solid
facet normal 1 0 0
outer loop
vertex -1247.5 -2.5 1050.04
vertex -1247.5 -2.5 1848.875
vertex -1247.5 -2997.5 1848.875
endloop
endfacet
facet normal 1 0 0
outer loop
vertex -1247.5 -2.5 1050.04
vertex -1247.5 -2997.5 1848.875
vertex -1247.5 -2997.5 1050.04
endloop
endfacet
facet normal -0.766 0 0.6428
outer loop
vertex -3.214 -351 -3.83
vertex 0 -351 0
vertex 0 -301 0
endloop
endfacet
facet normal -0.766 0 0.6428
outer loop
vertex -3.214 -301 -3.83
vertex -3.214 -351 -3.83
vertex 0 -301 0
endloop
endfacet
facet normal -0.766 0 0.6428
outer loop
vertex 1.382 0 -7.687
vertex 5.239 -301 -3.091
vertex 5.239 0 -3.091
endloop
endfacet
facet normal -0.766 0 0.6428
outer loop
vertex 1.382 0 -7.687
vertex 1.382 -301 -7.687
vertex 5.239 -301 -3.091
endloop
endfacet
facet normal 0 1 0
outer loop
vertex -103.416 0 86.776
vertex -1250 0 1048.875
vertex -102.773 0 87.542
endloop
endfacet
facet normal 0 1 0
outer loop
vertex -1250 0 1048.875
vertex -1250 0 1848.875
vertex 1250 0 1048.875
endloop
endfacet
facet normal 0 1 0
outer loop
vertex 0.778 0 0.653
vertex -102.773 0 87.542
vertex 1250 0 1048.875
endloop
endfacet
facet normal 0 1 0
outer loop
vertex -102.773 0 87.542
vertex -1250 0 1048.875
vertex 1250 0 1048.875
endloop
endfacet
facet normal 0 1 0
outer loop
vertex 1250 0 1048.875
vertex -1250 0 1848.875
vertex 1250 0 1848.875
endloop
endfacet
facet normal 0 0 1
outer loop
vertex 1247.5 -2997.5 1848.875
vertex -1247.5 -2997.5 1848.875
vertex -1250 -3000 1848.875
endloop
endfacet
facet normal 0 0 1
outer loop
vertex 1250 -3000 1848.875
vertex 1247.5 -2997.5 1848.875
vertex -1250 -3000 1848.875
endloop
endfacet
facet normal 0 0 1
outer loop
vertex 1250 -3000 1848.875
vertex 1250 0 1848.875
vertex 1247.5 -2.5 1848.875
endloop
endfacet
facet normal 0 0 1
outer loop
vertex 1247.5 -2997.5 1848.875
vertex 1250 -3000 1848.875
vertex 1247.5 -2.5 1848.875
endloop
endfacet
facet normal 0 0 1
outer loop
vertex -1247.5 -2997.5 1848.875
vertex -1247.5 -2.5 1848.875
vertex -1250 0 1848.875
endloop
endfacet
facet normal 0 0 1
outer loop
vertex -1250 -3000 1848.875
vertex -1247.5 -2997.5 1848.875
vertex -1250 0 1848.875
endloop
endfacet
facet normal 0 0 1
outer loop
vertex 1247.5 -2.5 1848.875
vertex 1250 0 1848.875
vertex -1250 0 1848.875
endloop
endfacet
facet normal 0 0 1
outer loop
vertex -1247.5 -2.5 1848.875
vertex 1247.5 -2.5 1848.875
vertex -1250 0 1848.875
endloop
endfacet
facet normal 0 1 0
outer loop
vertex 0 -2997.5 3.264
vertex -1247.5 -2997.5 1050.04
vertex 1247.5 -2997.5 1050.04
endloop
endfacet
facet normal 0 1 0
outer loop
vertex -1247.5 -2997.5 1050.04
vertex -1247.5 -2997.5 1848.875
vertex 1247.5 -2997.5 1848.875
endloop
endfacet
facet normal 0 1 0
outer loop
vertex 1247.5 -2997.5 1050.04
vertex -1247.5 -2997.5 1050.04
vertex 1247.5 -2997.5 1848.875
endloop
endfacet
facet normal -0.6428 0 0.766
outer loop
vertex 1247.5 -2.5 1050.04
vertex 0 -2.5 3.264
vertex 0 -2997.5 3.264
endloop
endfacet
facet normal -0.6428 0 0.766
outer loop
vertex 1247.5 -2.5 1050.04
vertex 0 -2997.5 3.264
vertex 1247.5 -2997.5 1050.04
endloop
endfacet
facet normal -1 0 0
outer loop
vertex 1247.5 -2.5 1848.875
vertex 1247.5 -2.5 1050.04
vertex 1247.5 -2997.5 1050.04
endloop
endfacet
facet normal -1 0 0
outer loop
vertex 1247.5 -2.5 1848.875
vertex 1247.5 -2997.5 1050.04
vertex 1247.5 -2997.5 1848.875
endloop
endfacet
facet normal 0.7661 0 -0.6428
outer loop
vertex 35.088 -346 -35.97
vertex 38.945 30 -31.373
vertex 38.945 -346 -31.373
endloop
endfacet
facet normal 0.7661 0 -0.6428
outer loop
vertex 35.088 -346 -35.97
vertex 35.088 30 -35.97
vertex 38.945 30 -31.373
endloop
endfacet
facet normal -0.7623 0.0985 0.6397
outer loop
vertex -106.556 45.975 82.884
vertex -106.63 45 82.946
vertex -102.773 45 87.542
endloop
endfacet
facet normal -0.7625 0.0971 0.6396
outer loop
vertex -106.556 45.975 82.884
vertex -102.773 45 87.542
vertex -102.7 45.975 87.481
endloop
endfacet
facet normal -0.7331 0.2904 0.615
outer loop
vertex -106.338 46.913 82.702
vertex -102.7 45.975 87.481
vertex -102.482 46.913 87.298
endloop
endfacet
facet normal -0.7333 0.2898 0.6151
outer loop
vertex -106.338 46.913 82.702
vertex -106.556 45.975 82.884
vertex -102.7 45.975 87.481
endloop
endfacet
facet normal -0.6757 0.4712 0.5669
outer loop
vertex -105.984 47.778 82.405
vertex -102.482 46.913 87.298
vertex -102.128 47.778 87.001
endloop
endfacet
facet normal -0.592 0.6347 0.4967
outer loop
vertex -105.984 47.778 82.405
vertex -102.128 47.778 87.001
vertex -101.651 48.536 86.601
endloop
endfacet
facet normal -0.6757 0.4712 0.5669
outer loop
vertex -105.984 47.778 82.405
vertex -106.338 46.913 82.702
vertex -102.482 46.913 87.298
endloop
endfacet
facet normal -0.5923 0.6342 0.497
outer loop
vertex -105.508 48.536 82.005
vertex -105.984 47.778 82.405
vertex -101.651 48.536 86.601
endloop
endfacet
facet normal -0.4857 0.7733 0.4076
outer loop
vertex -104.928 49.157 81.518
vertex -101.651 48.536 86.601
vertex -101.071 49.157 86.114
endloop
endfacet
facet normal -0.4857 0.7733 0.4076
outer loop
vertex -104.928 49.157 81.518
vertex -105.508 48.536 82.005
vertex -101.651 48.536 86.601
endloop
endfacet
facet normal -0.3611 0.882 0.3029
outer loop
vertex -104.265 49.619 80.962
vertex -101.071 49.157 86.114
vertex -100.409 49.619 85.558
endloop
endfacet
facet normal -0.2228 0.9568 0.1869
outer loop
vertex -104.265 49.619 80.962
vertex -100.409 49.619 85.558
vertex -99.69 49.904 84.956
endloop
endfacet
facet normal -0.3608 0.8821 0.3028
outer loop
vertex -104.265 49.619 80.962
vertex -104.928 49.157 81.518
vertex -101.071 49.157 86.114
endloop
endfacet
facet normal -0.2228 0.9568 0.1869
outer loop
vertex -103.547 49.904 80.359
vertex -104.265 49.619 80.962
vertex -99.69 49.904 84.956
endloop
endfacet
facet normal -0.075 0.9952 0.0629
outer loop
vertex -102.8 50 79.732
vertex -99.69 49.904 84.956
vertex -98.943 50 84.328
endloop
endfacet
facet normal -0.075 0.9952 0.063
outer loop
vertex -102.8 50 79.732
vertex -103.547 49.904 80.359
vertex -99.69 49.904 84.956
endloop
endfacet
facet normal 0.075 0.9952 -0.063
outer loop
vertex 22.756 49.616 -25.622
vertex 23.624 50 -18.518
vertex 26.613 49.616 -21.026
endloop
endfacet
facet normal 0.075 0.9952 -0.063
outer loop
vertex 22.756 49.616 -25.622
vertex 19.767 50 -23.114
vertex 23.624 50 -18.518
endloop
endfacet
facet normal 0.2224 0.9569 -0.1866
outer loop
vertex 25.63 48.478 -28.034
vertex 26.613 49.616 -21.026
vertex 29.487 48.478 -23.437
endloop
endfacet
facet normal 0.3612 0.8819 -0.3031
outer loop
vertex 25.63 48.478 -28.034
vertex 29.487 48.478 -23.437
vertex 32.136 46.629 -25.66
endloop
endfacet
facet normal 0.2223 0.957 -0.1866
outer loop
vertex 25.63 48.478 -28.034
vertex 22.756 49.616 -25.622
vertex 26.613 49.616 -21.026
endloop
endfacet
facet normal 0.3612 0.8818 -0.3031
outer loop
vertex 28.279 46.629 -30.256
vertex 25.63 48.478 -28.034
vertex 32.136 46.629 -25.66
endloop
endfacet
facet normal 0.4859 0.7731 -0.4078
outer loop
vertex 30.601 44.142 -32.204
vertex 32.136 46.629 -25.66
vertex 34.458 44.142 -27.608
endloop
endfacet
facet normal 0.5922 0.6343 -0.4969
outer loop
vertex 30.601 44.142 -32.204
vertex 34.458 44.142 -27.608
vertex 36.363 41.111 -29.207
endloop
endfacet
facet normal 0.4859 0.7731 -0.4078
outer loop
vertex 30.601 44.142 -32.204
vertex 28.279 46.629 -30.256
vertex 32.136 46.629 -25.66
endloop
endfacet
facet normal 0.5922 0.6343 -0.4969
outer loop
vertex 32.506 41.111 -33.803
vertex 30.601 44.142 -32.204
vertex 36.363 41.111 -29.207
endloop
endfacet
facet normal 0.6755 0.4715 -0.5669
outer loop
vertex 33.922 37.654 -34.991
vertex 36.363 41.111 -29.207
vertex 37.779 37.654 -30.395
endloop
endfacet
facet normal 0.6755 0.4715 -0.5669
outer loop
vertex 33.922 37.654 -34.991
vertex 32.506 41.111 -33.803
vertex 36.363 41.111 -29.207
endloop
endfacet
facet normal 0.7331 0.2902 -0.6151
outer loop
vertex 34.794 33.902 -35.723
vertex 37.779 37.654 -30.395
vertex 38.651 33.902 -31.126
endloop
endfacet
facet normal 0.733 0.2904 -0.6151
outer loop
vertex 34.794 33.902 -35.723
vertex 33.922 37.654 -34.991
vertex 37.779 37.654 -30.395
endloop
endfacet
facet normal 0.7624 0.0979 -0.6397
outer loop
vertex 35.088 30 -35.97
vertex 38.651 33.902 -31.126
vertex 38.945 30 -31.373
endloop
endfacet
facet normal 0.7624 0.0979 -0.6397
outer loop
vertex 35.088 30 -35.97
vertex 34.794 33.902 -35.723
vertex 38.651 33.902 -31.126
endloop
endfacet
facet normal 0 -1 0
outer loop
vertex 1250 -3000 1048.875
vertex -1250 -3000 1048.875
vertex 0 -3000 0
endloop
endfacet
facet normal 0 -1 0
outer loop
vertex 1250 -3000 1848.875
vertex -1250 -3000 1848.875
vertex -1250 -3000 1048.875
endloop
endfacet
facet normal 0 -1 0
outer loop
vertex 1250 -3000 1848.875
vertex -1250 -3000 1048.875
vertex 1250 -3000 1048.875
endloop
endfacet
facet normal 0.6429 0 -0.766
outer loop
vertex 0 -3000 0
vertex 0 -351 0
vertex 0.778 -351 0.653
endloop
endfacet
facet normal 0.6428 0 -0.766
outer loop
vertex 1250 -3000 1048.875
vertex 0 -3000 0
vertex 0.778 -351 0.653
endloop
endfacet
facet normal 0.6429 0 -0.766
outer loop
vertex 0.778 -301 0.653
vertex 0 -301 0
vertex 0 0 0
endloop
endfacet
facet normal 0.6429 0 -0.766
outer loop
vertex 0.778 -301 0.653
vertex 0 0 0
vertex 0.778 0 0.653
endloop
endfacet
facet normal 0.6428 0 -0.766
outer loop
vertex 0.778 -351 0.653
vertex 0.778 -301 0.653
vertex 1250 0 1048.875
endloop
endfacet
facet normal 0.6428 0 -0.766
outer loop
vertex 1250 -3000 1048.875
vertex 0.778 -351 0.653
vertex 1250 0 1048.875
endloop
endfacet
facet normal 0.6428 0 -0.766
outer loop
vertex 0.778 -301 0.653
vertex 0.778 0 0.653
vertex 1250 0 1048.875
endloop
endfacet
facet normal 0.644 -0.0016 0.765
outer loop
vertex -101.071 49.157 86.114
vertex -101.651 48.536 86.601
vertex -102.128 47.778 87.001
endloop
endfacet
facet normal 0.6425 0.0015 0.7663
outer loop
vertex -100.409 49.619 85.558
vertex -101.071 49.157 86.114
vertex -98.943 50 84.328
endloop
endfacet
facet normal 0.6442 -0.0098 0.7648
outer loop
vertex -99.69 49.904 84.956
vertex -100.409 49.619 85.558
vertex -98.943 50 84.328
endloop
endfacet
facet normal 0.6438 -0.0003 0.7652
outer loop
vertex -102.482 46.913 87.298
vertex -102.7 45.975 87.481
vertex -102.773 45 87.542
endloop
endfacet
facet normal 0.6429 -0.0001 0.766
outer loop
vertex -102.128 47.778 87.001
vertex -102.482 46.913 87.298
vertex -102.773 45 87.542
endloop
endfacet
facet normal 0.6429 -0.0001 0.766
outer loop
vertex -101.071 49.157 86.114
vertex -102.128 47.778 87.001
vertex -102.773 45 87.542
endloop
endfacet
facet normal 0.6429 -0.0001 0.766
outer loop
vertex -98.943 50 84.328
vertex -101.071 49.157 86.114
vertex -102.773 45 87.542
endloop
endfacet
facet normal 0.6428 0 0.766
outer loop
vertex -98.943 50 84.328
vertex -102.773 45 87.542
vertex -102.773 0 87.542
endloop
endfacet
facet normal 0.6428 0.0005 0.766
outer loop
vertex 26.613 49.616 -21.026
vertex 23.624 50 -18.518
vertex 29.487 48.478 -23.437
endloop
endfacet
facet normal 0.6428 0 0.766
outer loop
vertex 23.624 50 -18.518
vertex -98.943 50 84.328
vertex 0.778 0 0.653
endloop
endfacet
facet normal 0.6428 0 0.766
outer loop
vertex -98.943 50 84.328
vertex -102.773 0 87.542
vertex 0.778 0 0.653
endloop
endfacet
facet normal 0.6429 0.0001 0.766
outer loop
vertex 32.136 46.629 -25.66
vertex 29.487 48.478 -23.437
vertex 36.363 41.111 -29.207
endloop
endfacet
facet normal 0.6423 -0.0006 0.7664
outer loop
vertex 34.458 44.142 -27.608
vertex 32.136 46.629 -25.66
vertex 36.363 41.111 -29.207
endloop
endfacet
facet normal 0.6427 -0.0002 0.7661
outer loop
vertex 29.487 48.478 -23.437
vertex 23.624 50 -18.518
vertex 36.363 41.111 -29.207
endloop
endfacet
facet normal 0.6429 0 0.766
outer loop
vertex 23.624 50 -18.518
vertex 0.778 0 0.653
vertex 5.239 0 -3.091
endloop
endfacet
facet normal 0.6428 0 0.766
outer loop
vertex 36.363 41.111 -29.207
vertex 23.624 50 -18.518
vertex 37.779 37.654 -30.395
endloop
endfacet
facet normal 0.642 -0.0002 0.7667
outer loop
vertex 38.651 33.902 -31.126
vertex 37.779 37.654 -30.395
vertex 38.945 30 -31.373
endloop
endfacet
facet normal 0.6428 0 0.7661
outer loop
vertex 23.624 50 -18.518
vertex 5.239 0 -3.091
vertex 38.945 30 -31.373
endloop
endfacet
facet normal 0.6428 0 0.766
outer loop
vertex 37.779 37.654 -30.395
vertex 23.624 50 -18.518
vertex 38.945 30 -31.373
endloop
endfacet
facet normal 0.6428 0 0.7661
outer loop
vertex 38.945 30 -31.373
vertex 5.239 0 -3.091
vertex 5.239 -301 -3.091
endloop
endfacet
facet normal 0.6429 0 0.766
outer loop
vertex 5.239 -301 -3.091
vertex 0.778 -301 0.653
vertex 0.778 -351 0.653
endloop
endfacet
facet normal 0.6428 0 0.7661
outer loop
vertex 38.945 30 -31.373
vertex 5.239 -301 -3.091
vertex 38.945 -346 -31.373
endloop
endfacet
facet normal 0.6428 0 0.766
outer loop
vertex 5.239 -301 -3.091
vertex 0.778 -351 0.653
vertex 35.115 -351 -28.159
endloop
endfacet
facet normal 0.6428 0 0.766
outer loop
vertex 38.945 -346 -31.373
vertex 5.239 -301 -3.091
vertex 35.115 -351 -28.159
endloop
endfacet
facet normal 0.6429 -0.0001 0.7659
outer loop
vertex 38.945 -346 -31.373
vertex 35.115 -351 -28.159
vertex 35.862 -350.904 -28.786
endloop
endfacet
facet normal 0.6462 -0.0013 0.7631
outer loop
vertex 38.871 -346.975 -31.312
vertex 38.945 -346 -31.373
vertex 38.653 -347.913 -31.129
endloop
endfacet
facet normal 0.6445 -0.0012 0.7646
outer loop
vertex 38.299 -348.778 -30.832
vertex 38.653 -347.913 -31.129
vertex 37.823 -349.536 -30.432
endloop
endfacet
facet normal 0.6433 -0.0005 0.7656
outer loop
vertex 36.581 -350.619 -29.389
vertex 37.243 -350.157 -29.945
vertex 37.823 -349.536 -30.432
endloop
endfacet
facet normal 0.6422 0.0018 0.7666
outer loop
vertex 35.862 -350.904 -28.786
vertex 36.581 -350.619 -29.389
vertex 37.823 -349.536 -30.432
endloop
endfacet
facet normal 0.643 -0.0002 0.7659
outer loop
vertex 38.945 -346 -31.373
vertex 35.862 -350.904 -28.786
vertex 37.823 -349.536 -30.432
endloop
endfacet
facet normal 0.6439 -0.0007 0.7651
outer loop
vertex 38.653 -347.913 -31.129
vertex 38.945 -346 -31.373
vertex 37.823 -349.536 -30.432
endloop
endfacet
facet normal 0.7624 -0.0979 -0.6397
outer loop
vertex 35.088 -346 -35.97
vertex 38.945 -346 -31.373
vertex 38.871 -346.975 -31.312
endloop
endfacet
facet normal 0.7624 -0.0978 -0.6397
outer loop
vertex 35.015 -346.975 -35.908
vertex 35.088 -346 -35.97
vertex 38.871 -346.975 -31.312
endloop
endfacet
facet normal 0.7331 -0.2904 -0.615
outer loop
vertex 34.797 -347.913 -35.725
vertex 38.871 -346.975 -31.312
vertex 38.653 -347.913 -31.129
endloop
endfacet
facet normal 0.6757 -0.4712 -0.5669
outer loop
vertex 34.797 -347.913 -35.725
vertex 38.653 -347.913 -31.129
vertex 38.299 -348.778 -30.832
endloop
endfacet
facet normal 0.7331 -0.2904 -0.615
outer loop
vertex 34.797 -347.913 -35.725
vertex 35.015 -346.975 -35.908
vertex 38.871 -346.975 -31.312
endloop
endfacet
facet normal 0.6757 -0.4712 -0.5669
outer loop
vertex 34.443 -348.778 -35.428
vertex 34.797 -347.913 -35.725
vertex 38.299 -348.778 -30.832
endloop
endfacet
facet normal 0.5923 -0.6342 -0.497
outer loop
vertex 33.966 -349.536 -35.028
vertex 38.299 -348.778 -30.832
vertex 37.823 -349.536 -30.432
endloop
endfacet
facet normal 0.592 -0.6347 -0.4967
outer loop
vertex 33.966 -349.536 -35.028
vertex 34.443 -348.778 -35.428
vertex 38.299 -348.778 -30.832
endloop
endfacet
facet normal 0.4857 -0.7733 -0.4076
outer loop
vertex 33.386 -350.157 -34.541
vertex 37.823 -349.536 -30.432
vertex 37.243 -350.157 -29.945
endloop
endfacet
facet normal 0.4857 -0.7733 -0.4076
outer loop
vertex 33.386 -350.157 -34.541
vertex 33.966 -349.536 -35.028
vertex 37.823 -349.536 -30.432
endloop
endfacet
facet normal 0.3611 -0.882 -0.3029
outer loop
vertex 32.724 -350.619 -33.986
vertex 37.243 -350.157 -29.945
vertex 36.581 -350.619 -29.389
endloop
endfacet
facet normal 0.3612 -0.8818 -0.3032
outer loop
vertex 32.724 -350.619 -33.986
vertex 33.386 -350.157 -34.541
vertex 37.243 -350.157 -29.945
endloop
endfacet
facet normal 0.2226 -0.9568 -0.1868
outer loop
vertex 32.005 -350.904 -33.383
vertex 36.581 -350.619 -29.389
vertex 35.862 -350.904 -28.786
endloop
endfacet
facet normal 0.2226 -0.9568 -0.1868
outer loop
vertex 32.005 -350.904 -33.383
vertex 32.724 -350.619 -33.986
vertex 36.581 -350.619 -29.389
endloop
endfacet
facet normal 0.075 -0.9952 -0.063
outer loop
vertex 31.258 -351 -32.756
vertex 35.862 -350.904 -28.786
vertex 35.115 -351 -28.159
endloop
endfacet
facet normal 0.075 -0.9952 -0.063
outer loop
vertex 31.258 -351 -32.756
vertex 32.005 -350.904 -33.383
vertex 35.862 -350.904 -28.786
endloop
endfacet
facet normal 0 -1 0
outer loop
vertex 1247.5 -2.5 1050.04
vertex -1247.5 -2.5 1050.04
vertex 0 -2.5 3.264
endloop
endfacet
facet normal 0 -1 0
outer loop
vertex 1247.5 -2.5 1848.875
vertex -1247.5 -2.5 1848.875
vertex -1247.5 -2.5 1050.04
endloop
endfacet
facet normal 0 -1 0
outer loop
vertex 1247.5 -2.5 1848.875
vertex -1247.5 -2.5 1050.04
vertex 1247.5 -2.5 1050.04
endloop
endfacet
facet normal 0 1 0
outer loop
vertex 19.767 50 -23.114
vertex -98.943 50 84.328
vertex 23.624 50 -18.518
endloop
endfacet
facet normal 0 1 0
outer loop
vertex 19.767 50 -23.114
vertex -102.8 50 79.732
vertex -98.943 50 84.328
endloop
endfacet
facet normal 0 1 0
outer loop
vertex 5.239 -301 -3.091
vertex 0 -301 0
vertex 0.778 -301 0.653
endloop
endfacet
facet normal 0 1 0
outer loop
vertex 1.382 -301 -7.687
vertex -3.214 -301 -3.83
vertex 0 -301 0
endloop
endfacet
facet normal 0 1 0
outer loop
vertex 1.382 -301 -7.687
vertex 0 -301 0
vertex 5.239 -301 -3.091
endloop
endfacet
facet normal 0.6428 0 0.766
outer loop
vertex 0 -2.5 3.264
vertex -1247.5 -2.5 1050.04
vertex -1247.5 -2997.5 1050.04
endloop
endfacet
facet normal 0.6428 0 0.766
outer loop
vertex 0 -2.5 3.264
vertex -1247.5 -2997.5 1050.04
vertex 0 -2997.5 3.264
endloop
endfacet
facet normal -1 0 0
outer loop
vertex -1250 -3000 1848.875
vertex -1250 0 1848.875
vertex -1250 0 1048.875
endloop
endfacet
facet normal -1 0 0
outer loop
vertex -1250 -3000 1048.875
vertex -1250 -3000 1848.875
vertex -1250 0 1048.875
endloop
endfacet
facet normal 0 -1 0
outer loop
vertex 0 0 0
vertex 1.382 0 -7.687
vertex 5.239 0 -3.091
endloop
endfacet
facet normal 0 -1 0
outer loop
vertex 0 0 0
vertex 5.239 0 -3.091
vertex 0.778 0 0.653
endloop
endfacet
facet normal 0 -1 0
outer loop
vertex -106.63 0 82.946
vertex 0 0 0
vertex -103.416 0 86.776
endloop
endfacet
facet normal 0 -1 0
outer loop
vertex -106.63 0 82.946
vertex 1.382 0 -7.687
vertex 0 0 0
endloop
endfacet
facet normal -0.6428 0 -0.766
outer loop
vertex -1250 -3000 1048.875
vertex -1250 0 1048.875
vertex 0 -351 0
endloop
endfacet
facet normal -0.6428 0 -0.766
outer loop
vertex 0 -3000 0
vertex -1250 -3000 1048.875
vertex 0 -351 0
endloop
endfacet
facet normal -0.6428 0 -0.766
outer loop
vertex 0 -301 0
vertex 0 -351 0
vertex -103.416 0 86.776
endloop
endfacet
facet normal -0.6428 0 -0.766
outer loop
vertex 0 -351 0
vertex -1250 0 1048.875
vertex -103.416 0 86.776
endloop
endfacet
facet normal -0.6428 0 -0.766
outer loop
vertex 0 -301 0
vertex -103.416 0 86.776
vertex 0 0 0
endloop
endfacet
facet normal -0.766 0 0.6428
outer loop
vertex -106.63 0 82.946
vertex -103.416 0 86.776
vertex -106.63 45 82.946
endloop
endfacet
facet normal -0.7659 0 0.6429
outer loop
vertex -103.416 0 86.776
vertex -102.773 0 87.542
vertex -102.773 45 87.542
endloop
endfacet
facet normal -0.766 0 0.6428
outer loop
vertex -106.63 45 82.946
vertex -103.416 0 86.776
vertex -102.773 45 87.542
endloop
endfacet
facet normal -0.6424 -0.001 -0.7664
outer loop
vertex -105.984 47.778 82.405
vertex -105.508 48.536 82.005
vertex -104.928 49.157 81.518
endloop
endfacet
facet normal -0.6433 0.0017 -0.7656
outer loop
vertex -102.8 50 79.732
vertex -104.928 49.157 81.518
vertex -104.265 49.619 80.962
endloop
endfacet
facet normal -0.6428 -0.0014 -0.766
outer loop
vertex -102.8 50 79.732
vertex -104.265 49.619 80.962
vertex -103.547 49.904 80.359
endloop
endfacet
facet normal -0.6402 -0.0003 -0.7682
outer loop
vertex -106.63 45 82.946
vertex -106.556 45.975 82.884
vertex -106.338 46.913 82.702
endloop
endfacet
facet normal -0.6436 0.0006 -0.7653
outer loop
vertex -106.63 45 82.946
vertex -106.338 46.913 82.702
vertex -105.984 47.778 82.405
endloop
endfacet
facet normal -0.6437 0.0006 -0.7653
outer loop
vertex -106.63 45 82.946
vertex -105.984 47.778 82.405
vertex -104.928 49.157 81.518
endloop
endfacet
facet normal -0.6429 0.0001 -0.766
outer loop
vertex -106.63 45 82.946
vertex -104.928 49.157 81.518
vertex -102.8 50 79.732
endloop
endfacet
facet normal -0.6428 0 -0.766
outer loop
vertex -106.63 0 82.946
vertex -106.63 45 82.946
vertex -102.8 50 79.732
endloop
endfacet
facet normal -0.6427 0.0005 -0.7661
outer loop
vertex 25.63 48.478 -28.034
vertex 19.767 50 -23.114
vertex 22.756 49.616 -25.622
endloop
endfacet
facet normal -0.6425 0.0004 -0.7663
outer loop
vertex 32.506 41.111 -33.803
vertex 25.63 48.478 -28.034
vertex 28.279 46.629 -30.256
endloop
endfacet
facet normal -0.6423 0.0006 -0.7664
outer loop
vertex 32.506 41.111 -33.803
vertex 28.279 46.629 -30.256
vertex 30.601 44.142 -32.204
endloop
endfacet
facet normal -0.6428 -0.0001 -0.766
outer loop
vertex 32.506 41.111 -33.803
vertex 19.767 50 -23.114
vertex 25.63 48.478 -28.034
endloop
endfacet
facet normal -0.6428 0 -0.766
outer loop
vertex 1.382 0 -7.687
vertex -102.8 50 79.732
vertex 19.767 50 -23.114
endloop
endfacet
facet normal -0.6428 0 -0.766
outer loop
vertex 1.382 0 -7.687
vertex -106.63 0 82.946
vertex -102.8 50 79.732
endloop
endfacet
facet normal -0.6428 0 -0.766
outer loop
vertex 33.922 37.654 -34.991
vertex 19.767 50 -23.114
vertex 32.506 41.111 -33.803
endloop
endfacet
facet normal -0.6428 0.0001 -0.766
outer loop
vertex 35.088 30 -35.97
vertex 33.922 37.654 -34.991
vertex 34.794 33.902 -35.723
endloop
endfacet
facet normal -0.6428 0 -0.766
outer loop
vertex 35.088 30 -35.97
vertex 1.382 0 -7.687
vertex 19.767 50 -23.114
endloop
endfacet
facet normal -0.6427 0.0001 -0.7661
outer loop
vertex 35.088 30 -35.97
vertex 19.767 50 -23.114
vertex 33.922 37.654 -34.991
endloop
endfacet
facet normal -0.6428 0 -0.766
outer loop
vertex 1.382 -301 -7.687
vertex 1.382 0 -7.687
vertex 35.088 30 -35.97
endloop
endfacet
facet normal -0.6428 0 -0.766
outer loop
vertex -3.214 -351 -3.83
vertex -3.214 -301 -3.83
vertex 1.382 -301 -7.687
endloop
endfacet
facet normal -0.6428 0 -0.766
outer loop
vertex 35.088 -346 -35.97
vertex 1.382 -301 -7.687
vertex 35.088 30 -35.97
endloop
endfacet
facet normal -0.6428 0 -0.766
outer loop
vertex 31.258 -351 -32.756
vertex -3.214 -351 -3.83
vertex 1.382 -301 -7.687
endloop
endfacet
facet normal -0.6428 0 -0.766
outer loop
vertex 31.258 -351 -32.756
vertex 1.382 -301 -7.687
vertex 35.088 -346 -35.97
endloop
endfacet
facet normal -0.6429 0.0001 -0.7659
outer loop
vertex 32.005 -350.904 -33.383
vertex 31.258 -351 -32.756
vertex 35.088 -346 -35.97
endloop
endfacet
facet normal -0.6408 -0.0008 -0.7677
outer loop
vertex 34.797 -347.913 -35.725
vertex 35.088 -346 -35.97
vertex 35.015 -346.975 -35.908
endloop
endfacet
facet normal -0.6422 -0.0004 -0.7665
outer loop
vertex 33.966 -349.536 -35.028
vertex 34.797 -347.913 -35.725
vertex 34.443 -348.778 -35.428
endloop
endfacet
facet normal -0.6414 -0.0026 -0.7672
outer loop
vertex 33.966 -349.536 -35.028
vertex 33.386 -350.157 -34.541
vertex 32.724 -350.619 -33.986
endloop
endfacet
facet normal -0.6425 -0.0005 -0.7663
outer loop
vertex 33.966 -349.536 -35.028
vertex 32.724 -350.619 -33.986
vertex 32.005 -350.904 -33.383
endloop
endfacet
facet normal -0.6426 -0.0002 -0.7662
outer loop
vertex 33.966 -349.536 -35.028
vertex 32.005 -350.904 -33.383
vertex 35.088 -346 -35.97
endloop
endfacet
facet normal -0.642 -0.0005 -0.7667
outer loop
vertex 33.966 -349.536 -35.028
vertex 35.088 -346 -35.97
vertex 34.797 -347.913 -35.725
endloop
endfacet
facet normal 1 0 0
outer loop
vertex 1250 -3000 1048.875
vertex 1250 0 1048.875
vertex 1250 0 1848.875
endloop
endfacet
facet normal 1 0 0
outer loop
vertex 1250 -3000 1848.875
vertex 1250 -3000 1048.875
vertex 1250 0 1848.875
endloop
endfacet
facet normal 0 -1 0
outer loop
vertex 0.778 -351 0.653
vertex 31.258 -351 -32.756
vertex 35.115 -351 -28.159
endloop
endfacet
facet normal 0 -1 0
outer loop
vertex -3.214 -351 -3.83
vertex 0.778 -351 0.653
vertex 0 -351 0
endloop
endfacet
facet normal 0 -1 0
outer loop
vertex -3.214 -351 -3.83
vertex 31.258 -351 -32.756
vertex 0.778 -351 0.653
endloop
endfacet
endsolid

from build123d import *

# Parameters (mm, degrees)
F1_DEPTH      = 3000
F2_T          = -2.5
F4_DEPTH      = 5
F4_DEPTH_BACK = 1


with BuildPart() as f1:
    # F0 (on Front) → F1 (new body)
    with BuildSketch(Plane.XZ):
        Polygon((-1250, 1048.874539), (0, 0), (1250, 1048.874539), (1250, 1848.874539), (0, 1848.874539), (-1250, 1848.874539), align=None)
    extrude(amount=F1_DEPTH)

    # F2
    f2_openings = [f1.faces().sort_by_distance(p)[0] for p in [
        (0, -1500, 1848.874539),
    ]]
    offset(amount=F2_T, openings=f2_openings)

    # F3 (on face) → F4 (join, two sides)
    with BuildSketch(Plane(origin=(0, 0, 0), x_dir=(0.766044, 0, -0.642788), z_dir=(-0.642788, 0, -0.766044))) as f4_sk:
        with BuildLine():
            Line((6, 0), (-135, 0))
            Line((-135, 0), (-135, -45))
            ThreePointArc((-135, -45), (-133.535534, -48.535534), (-130, -50))
            Line((-130, -50), (30, -50))
            ThreePointArc((30, -50), (44.142136, -44.142136), (50, -30))
            Line((50, -30), (50, 346))
            ThreePointArc((50, 346), (48.535534, 349.535534), (45, 351))
            Line((45, 351), (0, 351))
            Line((0, 351), (0, 301))
            Line((0, 301), (6, 301))
            Line((6, 301), (6, 0))
        make_face()
    extrude(amount=F4_DEPTH)
    extrude(f4_sk.sketch, amount=-F4_DEPTH_BACK)


solid = f1.part
